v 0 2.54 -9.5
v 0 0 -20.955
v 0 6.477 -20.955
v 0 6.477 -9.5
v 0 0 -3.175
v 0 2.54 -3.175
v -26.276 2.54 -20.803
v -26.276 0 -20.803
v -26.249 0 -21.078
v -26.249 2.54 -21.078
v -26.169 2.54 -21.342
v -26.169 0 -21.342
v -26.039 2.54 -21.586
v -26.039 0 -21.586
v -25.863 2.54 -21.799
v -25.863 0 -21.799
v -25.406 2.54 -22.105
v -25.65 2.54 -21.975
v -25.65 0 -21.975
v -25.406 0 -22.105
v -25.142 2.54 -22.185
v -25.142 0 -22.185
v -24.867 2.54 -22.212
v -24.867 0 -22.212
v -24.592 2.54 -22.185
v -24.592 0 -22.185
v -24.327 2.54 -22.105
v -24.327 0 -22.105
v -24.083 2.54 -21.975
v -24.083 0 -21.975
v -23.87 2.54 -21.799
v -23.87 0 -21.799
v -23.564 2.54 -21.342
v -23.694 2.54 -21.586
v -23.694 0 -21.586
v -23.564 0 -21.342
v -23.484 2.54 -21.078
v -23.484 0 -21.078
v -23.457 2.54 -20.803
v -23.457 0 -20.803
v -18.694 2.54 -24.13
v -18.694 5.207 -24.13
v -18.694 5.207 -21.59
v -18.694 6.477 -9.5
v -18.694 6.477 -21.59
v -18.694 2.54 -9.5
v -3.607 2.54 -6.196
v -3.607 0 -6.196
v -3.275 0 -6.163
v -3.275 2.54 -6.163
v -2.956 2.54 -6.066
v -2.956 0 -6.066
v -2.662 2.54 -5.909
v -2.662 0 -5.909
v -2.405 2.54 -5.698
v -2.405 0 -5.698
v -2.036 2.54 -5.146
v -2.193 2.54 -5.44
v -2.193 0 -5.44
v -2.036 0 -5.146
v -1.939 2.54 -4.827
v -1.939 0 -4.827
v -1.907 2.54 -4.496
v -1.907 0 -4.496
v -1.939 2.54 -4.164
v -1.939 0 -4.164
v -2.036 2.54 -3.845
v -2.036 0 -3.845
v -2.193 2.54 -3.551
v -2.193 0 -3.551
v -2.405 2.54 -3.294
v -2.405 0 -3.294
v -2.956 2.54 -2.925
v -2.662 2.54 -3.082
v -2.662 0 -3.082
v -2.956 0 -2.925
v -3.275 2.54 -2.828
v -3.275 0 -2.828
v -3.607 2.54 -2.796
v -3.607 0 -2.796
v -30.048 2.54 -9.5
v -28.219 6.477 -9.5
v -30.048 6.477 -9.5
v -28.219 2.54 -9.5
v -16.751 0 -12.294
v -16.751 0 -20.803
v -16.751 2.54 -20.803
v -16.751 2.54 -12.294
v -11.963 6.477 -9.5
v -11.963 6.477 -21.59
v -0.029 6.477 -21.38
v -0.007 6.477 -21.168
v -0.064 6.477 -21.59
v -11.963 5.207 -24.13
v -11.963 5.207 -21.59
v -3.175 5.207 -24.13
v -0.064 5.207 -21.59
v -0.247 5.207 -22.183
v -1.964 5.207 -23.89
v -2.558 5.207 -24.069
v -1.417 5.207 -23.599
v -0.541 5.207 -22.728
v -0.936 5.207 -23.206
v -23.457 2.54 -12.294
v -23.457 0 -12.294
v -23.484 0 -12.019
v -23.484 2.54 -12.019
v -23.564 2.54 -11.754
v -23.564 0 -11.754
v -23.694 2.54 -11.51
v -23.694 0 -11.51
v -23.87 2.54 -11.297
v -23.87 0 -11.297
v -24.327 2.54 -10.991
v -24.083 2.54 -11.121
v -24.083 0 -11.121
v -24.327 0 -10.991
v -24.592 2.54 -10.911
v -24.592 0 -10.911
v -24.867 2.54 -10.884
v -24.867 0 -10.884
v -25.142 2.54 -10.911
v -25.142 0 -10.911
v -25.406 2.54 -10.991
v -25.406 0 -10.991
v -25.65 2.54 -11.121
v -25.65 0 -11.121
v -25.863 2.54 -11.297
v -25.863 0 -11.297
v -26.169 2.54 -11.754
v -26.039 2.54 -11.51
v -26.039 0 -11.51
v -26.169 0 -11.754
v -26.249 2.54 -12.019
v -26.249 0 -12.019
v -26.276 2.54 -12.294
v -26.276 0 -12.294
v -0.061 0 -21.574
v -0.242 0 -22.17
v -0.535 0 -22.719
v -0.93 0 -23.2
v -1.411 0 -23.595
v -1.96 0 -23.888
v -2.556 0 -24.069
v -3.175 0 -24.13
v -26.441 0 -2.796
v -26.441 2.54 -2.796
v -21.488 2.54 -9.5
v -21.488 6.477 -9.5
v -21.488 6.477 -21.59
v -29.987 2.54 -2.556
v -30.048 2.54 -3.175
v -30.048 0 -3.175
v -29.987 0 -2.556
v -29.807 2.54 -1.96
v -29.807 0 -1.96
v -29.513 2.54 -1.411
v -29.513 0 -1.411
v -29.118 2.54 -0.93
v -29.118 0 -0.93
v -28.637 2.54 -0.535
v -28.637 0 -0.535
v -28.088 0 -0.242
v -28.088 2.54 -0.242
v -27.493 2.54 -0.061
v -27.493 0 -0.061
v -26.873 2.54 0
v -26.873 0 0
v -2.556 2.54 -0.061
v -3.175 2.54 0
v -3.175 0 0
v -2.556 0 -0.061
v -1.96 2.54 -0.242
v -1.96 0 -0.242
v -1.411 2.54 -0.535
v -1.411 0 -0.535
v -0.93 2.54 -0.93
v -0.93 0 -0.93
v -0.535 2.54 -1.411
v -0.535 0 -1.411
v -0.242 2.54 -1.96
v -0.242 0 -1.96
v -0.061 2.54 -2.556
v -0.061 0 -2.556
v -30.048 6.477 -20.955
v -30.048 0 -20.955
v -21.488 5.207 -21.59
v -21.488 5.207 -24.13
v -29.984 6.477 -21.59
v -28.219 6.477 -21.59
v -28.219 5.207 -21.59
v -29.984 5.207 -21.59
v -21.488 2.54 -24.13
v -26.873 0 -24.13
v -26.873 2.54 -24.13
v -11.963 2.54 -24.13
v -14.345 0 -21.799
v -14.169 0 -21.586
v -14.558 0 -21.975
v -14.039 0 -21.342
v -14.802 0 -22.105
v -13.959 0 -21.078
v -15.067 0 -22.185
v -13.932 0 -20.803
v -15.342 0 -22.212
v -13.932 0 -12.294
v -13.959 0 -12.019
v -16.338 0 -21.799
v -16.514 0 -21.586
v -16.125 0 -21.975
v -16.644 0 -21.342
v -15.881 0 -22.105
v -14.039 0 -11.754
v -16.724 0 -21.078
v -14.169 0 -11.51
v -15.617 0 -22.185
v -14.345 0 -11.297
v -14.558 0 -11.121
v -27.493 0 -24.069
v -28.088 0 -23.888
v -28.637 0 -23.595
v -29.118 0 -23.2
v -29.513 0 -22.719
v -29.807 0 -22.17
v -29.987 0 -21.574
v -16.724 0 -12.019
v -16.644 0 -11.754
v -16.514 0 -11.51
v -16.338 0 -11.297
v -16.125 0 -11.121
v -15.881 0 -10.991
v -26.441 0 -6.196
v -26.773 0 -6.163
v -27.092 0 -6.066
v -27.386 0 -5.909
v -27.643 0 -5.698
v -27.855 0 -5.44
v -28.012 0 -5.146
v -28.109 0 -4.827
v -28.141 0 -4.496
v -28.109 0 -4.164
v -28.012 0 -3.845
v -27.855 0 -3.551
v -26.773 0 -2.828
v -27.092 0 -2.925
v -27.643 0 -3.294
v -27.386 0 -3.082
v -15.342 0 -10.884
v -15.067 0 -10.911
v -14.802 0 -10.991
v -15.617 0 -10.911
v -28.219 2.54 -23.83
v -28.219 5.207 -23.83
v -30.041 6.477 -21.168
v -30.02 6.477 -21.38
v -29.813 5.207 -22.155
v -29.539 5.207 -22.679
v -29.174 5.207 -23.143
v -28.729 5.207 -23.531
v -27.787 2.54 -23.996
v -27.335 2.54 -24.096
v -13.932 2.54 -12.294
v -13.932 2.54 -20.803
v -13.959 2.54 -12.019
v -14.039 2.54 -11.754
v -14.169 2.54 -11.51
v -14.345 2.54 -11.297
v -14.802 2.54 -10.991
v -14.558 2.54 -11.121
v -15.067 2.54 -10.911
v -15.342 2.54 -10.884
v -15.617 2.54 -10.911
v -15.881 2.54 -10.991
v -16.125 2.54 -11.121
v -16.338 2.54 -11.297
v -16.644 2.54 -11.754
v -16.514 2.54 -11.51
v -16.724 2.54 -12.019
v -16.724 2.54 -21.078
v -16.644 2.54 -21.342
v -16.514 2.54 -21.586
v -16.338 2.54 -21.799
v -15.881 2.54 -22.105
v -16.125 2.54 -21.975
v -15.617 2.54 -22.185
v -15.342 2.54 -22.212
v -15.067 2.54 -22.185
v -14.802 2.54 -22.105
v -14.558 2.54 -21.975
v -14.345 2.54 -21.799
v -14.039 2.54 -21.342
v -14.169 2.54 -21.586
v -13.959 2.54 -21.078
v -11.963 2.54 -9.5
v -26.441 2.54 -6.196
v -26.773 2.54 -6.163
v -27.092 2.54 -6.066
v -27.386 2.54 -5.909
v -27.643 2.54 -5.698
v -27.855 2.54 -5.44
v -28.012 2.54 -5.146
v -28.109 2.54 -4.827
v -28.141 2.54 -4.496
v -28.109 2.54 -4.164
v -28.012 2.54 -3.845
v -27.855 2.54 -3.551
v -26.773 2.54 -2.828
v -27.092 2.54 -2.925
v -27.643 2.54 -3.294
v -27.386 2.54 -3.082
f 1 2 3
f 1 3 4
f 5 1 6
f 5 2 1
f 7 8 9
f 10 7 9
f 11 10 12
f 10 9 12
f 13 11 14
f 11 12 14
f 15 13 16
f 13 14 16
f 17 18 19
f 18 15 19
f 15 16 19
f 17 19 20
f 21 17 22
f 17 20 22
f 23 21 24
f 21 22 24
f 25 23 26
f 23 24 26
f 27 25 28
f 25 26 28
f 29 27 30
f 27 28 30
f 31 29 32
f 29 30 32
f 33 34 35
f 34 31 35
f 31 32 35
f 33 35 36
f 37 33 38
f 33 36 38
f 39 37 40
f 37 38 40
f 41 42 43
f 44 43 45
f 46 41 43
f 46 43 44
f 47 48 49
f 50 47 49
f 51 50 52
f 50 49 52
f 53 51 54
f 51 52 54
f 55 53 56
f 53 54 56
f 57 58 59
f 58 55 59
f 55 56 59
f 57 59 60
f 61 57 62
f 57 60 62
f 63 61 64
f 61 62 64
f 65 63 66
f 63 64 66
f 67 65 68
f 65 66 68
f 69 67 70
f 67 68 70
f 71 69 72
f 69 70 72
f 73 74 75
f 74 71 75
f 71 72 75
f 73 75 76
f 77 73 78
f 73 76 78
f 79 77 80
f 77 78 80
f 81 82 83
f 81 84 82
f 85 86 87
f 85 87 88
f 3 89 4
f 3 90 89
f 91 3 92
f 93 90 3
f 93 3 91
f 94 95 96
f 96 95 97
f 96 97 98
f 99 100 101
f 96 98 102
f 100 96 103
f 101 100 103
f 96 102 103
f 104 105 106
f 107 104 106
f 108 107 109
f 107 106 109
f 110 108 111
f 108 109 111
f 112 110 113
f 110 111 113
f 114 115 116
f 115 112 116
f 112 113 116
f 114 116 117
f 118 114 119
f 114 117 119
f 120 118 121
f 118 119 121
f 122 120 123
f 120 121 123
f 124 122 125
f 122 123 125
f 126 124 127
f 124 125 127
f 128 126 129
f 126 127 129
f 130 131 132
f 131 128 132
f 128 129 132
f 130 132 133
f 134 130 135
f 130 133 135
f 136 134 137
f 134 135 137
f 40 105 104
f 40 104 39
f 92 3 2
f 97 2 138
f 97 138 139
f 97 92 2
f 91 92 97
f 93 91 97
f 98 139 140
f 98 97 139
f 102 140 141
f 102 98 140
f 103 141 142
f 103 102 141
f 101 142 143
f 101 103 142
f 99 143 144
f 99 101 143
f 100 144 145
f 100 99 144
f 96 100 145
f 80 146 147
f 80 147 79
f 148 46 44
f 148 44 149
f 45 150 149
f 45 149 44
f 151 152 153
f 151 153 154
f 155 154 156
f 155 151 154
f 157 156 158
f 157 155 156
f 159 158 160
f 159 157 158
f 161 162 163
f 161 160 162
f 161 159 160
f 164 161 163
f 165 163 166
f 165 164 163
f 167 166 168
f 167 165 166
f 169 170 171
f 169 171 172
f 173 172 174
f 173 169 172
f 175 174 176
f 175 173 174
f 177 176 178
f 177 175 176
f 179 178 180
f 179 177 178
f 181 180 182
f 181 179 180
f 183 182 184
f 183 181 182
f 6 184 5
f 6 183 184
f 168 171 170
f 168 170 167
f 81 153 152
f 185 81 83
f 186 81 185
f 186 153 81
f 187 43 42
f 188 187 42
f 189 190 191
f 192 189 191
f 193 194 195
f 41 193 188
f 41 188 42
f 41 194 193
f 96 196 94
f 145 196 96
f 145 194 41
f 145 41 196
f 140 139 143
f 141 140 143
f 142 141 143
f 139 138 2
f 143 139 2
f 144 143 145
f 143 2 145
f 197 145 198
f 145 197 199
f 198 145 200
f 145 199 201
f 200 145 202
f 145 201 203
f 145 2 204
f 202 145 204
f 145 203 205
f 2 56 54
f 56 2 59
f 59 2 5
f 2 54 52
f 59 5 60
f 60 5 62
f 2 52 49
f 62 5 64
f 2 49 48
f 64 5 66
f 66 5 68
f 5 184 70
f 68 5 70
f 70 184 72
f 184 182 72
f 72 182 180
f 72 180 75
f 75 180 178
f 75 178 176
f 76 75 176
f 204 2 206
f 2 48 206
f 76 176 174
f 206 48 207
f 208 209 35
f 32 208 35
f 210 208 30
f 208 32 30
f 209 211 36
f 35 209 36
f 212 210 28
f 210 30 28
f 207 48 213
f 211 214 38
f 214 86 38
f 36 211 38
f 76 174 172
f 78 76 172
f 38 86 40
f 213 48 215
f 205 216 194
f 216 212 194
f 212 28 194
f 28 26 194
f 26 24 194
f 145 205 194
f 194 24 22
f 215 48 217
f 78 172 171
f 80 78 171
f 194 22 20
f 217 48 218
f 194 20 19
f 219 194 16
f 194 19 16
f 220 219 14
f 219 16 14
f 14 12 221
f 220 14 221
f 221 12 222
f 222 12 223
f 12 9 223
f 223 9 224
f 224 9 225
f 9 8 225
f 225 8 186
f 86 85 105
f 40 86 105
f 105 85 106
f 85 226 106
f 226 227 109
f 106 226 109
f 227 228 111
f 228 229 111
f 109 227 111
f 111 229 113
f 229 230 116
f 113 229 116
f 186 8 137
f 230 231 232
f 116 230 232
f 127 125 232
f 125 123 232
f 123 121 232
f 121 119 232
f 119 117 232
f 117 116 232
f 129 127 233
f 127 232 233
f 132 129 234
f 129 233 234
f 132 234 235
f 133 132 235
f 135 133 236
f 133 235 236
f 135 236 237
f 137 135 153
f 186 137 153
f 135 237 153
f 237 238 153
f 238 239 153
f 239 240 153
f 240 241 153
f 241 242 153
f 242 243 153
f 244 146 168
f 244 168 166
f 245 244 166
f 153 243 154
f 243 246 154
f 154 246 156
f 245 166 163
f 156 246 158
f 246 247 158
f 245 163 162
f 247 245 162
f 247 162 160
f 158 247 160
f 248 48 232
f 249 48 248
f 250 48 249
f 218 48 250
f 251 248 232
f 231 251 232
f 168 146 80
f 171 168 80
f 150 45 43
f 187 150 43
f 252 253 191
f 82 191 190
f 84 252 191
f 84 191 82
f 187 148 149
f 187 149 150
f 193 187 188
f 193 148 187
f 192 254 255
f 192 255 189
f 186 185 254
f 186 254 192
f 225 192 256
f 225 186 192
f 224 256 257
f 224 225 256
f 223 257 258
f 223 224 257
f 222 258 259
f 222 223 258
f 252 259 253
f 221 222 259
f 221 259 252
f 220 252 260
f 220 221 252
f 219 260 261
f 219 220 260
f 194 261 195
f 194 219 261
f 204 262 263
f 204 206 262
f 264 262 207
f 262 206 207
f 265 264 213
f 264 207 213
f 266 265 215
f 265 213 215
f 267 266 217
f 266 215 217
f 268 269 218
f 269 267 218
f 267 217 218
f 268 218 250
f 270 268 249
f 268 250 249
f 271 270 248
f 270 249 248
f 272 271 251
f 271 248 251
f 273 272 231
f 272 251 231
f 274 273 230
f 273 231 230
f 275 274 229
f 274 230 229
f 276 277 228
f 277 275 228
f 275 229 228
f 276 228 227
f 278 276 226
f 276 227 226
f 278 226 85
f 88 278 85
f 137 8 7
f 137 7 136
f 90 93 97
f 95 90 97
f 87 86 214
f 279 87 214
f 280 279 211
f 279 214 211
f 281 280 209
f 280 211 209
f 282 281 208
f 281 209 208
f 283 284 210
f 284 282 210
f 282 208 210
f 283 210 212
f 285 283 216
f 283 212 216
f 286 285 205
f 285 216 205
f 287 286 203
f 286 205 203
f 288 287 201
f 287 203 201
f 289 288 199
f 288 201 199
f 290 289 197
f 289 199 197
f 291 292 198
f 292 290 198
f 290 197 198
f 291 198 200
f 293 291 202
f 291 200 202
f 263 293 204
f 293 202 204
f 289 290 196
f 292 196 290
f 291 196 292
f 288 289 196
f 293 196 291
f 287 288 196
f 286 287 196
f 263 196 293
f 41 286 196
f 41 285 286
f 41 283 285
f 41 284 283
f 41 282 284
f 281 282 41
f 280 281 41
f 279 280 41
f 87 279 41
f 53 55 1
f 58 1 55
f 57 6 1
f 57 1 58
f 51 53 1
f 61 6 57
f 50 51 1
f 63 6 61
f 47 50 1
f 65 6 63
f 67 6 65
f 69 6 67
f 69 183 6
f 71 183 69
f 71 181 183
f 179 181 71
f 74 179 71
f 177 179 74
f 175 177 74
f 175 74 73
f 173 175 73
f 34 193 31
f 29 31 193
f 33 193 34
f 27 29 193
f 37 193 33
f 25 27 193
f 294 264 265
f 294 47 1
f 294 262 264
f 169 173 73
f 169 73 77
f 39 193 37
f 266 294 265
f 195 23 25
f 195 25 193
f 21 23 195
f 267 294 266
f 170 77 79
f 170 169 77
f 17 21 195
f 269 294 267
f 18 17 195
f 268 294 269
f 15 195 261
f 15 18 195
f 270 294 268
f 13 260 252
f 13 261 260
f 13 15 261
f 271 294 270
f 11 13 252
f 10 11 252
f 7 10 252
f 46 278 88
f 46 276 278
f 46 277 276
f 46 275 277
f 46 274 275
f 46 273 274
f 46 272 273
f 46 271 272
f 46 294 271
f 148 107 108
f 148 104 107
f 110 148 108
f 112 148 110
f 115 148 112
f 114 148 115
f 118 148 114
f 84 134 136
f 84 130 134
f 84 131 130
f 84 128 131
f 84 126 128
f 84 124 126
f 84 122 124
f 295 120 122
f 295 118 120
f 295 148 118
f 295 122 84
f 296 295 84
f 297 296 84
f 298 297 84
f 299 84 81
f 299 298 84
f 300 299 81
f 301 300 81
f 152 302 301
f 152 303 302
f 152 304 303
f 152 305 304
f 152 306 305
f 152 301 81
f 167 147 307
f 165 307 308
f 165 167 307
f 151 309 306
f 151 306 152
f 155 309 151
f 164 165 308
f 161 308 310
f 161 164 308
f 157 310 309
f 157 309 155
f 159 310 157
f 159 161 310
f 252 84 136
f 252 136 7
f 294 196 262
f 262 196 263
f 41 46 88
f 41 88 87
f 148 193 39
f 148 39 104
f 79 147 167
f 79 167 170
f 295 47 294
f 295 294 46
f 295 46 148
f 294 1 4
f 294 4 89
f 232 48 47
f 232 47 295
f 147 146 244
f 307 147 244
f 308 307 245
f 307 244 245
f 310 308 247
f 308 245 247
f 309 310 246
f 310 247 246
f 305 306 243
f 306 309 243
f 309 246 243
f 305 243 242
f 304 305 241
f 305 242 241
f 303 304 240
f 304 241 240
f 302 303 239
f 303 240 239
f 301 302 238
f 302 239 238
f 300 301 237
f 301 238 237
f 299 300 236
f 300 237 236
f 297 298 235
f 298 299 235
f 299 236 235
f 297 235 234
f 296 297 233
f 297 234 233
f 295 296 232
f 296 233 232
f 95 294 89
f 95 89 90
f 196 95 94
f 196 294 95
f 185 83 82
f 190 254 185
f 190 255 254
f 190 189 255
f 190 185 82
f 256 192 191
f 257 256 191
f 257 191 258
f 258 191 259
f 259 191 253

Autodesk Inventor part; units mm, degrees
ref_plane "YZ Plane" through (0, 0, 0) normal (1, 0, 0) x (0, 1, 0)
sketch "Sketch1" plane through (0, 0, 0) normal (0, 1, 0) x (-1, 0, 0)
  line L0 (0, 0) -> (30.0482, 0)
  line L1 (30.0482, 0) -> (30.0482, -24.13)
  line L2 (30.0482, -24.13) -> (0, -24.13)
  line L3 (0, -24.13) -> (0, 0)
  line L4 (15.3416, -12.2936) -> (15.3416, -20.8026) construction
  line L5 (13.9319, -12.2936) -> (13.9319, -20.8026)
  line L6 (16.7513, -20.8026) -> (16.7513, -12.2936)
  arc A0 (16.7513, -12.2936) -> (13.9319, -12.2936) centre (15.3416, -12.2936) ccw
  arc A1 (13.9319, -20.8026) -> (16.7513, -20.8026) centre (15.3416, -20.8026) ccw
  line L7 (24.8666, -12.2936) -> (24.8666, -20.8026) construction
  line L8 (23.4569, -12.2936) -> (23.4569, -20.8026)
  line L9 (26.2763, -20.8026) -> (26.2763, -12.2936)
  arc A2 (26.2763, -12.2936) -> (23.4569, -12.2936) centre (24.8666, -12.2936) ccw
  arc A3 (23.4569, -20.8026) -> (26.2763, -20.8026) centre (24.8666, -20.8026) ccw
  line L10 (26.4414, -4.4958) -> (3.6068, -4.4958) construction
  line L11 (26.4414, -2.7958) -> (3.6068, -2.7958)
  line L12 (3.6068, -6.1958) -> (26.4414, -6.1958)
  arc A4 (26.4414, -6.1958) -> (26.4414, -2.7958) centre (26.4414, -4.4958) ccw
  arc A5 (3.6068, -2.7958) -> (3.6068, -6.1958) centre (3.6068, -4.4958) ccw
  point P0 (15.3416, -16.5481)
  point P1 (24.8666, -16.5481)
  point P2 (15.0241, -4.4958)
  dimension "d0" = 30.0482
  dimension "d1" = 24.13
  dimension "d5" = 12.2936
  dimension "d6" = 2.8194
  dimension "d8" = 3.3274
  dimension "d11" = 9.525
  dimension "d16" = 3.4
  dimension "d17" = 4.4958
  dimension "d18" = 3.6068
  dimension "d19" = 3.6068
  dimension "d43" = 5.1816
extrude "Shape" add sketch "Sketch1" along normal blind 2.54
sketch "Sketch2" plane through (0, 2.54, 0) normal (0, 1, 0) x (1, 0, 0)
  line L0 (0, 24.13) -> (-30.0482, 24.13) projected
  line L1 (0, 0) -> (0, 24.13) projected
  line L2 (-30.0482, 24.13) -> (0, 24.13)
  line L3 (0, 24.13) -> (0, 9.5)
  line L4 (0, 9.5) -> (-30.0482, 9.5)
  line L5 (-30.0482, 9.5) -> (-30.0482, 24.13)
  line L6 (-30.0482, 0) -> (0, 0) projected
  line L7 (-11.9634, 9.5) -> (-11.9634, 24.13)
  line L8 (-11.9634, 24.13) -> (-18.6944, 24.13)
  line L9 (-18.6944, 24.13) -> (-18.6944, 9.5)
  arc A0 (-16.7513, 12.2936) -> (-13.9319, 12.2936) centre (-15.3416, 12.2936) ccw projected
  line L10 (-18.1778, 2.3562) -> (-11.9634, 24.13) construction
  line L11 (-12.9982, 4.0205) -> (-18.6944, 24.13) construction
  line L12 (-18.6944, 9.5) -> (-1.5875, 9.5)
  line L13 (-28.2194, 24.13) -> (-28.2194, 9.5)
  line L14 (-21.4884, 9.5) -> (-21.4884, 24.13)
  line L15 (-28.2194, 9.5) -> (-11.1125, 9.5)
  line L16 (-21.4884, 24.13) -> (-28.2194, 24.13)
  point P0 (-11.9634, 24.13)
  point P1 (-21.4884, 9.5)
  point P2 (-18.6944, 9.5)
  point P3 (-28.2194, 24.13)
  dimension "d22" = 9.5
  dimension "d23" = 6.731
  dimension "d27" = 9.525
  dimension "d44" = 1.8288
extrude "Extrusion2" add sketch "Sketch2" along normal blind 3.937 contours L1 L4 L7 L0 | L9 L4 L14 L0 | L13 L4 L5 L0
ref_plane "Work Plane1" through (-15.3416, 0, -12.2936) normal (1, 0, 0) x (0, 0, -1)
ref_plane "Work Plane2" through (-24.8666, 0, -12.2936) normal (1, 0, 0) x (0, 0, -1)
sketch "Sketch3" plane through (0, 0, 0) normal (1, 0, 0) x (0, 0, -1)
  line L0 (24.13, 6.477) -> (9.5, 6.477) projected
  line L1 (24.13, 6.477) -> (21.59, 6.477)
  line L2 (21.59, 6.477) -> (21.59, 5.207)
  line L3 (21.59, 5.207) -> (24.13, 5.207)
  line L4 (24.13, 5.207) -> (24.13, 6.477)
  point P0 (0, 0)
  dimension "d35" = 2.54
  dimension "d36" = 1.27
extrude "Extrusion3" cut sketch "Sketch3" against normal through all
fillet "Fillet2" radius 3.175 4 edges at (0, 1.27, 0) (0, 2.6035, -24.13) (-30.0482, 2.6035, -24.13) (-30.0482, 1.27, 0)
equation "\"d19\" = d18"
equation "\"d27\" = d11"
properties part number "Limit switch mount top nut well"
